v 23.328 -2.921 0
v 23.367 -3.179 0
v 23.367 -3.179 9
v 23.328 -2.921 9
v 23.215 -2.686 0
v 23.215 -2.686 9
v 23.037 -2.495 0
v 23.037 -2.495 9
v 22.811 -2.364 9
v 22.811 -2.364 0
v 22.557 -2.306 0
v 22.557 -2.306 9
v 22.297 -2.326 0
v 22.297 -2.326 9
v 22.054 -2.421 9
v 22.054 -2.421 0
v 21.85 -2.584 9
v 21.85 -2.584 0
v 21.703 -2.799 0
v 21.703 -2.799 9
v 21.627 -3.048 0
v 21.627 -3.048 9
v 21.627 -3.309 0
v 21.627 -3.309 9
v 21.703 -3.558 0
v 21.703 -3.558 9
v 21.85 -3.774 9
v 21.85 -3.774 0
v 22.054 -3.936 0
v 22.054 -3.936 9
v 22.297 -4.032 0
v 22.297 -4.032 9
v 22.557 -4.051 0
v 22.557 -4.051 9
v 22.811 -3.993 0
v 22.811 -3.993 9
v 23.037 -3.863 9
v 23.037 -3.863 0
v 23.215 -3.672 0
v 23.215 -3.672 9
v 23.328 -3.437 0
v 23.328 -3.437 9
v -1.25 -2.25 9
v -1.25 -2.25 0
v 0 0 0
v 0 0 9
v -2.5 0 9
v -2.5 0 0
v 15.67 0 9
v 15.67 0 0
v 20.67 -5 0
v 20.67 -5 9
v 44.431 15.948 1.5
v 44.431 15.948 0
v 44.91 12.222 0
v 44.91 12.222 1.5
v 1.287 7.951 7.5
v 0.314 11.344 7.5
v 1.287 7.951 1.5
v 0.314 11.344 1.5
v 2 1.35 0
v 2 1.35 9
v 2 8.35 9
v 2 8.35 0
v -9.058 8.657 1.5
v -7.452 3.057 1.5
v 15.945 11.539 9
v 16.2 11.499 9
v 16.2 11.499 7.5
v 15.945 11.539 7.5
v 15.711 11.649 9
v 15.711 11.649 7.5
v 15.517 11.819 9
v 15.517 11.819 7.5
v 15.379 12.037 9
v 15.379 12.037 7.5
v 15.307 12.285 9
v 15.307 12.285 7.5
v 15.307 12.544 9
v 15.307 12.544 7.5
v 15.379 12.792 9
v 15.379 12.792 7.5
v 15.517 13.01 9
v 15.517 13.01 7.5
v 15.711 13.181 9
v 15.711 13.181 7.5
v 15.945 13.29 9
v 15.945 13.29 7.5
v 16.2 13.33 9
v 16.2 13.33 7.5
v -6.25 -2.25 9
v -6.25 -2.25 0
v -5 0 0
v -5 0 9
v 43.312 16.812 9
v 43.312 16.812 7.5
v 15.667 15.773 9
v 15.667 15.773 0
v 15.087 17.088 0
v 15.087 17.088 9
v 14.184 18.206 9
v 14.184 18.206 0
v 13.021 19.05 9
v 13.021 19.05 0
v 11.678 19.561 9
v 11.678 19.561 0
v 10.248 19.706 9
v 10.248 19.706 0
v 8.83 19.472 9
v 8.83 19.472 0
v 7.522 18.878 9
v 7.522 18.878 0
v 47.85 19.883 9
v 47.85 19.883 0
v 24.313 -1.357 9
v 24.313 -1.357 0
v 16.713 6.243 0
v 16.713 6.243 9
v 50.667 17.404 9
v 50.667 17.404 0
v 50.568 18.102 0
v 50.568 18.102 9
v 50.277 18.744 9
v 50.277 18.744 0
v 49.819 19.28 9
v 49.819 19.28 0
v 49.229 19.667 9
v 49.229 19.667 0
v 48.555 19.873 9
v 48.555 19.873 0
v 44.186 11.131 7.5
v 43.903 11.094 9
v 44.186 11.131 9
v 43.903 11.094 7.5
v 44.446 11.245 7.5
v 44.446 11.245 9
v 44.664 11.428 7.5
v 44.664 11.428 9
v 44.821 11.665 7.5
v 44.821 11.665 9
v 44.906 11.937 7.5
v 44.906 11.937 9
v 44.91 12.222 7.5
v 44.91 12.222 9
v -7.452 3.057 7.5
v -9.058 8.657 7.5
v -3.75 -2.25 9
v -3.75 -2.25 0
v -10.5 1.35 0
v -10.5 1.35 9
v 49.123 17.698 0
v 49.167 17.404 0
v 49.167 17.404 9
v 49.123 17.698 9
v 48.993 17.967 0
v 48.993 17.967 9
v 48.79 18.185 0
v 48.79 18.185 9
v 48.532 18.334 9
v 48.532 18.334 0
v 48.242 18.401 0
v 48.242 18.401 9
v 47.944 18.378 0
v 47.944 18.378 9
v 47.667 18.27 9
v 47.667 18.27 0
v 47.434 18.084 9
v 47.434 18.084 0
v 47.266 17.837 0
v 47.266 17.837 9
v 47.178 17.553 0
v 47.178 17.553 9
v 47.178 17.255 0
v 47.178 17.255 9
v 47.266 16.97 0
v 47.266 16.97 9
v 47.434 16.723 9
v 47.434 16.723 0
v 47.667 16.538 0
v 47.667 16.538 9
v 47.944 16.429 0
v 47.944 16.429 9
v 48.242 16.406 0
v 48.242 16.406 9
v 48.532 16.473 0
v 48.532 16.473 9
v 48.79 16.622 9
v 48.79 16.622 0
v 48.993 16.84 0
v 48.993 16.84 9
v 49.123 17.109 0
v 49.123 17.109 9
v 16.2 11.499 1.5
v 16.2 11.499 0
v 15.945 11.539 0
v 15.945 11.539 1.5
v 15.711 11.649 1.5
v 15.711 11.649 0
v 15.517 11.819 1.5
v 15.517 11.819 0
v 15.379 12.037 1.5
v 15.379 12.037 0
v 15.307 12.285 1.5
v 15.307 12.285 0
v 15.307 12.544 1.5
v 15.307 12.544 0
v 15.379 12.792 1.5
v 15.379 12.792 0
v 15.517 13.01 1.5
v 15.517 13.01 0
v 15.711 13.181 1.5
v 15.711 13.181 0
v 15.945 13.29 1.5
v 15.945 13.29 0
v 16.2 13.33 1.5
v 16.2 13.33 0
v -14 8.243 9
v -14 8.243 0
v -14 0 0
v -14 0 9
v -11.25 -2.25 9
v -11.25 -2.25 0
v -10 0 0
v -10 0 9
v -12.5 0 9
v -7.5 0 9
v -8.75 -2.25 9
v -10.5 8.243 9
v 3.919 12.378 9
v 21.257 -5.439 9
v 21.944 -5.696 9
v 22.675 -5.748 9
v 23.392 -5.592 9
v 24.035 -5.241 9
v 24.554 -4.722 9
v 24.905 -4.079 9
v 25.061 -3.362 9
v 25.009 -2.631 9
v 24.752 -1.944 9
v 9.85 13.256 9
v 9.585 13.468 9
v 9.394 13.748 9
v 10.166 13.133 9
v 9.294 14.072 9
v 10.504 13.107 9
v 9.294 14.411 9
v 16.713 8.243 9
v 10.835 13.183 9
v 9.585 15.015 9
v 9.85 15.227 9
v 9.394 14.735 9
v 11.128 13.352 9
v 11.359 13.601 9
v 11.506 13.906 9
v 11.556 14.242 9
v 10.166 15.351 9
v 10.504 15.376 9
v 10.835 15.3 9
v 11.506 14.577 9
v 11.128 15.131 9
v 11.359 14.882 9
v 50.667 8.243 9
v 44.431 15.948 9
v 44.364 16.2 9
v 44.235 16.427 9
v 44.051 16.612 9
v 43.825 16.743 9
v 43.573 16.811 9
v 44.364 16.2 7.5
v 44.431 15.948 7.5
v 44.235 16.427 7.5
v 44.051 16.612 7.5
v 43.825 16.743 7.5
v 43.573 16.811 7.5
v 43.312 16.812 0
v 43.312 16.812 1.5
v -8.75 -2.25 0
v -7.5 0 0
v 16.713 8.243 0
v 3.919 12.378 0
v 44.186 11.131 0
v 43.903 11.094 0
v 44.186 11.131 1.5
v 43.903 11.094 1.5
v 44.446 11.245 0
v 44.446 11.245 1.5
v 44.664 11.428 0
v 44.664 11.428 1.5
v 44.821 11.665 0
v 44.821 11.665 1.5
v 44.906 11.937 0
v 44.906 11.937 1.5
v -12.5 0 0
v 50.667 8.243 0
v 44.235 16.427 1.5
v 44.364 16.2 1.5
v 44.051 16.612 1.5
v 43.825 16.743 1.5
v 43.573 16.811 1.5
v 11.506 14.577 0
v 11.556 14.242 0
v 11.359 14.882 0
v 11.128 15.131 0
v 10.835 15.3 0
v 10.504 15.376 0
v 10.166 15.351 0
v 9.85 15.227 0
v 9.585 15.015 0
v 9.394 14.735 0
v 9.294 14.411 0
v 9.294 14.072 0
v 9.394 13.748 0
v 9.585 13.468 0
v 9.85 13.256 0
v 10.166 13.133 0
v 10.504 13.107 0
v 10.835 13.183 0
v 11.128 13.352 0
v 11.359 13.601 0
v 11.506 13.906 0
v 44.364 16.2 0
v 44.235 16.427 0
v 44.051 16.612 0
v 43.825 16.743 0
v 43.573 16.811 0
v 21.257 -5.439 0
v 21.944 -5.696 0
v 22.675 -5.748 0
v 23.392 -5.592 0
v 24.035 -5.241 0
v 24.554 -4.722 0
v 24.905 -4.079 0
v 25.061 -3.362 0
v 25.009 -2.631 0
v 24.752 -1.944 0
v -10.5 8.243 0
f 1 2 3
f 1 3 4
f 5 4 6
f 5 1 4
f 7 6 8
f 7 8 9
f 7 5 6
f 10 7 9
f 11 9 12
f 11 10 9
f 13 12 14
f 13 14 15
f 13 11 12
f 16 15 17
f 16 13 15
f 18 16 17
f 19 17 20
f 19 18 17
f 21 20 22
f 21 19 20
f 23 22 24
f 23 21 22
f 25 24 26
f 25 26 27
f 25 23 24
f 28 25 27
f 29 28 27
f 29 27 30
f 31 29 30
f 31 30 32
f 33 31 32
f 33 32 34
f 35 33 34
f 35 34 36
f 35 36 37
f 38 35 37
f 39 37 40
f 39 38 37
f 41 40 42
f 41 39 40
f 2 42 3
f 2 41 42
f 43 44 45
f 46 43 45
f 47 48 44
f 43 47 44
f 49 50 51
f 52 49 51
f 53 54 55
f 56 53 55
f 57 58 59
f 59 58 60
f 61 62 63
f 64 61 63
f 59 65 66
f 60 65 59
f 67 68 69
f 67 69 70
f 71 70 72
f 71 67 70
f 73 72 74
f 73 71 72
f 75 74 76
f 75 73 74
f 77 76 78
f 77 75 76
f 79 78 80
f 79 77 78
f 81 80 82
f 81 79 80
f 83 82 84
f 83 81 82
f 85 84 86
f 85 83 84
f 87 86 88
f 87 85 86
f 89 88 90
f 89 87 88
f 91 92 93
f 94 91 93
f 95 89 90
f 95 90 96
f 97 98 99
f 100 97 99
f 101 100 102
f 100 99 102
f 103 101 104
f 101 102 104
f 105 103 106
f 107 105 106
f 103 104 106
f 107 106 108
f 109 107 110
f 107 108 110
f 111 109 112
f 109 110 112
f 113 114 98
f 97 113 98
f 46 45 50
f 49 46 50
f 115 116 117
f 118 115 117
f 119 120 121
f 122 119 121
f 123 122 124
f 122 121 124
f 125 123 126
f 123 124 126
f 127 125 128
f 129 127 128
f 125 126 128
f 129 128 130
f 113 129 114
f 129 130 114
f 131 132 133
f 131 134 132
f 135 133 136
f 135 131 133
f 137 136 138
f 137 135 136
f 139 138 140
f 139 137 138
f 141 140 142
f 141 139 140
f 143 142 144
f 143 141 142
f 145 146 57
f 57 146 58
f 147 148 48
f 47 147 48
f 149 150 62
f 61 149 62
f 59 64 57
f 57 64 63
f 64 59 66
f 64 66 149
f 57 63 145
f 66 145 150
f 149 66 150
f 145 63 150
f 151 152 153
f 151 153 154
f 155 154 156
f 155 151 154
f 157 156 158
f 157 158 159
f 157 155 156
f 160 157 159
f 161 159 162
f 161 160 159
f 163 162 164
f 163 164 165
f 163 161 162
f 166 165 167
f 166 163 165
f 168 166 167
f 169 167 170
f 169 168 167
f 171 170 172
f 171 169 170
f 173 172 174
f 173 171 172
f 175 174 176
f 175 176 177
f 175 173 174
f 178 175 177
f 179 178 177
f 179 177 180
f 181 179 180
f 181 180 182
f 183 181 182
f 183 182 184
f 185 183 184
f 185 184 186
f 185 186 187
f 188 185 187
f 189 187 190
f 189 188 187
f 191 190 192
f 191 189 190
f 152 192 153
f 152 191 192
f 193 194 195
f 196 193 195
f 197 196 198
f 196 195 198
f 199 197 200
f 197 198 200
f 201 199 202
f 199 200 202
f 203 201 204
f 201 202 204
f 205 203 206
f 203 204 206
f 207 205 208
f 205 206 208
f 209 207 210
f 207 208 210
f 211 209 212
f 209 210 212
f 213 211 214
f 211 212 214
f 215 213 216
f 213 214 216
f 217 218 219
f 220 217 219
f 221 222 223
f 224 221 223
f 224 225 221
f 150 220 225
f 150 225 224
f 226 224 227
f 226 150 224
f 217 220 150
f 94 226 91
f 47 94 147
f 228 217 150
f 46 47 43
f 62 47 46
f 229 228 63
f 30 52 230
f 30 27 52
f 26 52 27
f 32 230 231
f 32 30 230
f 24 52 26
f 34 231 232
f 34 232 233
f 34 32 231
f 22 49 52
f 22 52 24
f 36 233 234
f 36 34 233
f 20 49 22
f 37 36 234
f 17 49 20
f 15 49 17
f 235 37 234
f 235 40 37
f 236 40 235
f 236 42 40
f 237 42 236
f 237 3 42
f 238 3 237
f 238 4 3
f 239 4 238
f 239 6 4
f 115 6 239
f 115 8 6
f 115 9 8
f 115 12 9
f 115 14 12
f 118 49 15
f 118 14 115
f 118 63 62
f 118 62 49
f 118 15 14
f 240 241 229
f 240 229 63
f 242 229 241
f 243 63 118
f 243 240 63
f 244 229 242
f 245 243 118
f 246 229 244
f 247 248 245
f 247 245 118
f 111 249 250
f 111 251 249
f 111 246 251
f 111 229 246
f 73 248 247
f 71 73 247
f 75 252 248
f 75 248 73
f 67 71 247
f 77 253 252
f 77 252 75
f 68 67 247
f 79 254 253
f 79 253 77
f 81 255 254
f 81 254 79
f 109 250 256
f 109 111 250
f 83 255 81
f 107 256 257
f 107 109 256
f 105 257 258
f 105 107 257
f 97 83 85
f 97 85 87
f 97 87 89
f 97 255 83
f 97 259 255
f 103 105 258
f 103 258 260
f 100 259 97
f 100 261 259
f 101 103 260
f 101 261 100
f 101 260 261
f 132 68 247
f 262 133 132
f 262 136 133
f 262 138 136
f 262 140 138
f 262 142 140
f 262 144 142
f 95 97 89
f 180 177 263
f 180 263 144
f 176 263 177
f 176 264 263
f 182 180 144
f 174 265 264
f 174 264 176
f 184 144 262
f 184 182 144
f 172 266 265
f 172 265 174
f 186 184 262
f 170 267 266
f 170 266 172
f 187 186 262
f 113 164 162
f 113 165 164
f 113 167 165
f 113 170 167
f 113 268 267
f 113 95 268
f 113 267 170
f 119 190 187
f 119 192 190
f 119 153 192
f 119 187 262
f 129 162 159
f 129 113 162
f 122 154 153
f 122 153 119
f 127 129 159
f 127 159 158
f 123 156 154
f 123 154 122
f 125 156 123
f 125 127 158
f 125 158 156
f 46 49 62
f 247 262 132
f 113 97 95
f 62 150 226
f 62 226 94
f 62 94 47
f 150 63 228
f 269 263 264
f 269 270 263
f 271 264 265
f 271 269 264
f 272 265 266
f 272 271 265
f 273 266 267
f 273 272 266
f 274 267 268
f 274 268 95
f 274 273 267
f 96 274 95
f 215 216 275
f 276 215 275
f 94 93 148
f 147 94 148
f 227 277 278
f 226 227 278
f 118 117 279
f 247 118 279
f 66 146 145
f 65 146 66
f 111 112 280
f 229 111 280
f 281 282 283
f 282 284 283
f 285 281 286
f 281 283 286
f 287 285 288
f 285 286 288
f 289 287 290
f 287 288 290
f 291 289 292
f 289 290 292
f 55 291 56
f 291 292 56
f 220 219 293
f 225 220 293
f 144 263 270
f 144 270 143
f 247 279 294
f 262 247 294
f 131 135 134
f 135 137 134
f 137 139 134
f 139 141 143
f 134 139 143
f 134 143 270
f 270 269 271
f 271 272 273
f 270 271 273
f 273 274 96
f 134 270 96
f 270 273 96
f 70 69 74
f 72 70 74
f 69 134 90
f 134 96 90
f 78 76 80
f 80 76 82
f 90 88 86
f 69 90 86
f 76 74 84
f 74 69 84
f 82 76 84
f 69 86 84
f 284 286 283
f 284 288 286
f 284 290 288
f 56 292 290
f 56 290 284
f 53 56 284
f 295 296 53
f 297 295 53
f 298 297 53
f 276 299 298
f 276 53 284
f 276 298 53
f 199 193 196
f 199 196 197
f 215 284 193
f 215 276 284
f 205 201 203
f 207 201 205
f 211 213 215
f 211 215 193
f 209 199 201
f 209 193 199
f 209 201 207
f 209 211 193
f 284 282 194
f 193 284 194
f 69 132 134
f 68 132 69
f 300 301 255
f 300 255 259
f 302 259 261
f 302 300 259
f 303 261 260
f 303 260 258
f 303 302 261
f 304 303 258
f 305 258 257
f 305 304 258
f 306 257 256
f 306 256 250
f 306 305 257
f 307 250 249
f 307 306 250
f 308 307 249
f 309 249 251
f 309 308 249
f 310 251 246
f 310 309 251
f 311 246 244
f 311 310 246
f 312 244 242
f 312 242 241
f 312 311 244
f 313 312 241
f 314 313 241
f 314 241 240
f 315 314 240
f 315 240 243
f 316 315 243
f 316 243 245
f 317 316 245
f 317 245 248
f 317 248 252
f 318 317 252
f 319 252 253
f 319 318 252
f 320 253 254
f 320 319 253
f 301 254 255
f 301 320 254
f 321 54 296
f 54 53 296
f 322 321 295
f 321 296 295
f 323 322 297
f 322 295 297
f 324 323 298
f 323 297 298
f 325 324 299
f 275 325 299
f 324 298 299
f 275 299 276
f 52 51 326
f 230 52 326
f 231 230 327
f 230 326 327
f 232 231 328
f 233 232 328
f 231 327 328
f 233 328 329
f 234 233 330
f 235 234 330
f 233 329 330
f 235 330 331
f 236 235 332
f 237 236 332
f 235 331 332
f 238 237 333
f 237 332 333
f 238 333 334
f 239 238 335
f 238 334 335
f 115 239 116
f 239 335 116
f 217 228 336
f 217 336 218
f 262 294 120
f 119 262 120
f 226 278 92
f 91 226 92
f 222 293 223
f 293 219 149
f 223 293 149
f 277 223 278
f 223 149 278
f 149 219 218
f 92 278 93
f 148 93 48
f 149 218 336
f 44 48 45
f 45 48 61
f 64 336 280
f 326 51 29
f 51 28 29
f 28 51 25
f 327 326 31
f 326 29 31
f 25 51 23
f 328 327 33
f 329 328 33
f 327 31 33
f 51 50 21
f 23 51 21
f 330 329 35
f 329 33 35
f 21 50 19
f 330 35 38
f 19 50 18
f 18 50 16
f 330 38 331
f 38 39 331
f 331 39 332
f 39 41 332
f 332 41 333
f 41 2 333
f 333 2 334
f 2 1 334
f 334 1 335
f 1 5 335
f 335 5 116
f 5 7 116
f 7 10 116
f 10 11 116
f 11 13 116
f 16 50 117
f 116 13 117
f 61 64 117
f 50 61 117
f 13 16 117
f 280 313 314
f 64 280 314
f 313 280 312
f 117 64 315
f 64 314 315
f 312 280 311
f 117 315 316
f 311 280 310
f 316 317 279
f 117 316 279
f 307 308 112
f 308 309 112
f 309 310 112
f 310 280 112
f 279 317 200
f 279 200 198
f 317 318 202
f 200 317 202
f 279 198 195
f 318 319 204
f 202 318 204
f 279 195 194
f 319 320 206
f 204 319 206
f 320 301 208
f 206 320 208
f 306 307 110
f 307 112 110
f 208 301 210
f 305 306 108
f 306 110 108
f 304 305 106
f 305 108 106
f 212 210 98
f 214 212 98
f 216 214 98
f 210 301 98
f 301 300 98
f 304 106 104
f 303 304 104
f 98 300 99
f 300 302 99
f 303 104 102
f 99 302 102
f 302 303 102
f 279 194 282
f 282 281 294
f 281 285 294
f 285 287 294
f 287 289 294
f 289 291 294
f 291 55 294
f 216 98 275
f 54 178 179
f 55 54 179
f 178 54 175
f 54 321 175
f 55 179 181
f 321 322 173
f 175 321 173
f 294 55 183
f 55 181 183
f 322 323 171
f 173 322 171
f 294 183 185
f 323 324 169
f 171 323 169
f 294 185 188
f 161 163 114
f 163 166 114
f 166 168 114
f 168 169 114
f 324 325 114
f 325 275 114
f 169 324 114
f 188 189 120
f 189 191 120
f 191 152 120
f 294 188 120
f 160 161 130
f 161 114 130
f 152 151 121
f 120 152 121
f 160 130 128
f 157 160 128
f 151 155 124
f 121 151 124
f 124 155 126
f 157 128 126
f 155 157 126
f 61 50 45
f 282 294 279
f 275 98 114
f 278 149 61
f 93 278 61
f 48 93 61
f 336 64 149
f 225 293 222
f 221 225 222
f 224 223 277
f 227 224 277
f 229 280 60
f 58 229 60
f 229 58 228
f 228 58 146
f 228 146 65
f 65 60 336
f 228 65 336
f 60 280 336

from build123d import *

# Parameters (mm, degrees)
SKETCH1_R            = 1.1375
SKETCH1_R_2          = 0.875
SKETCH1_R_3          = 1
BOSS_EXTRUDE1_DEPTH  = 9
CUT_EXTRUDE1_DEPTH   = 56.175080092
CUT_EXTRUDE2_REACH   = 58.746
SKETCH4_W            = 9.75
SKETCH4_H            = 6
CUT_EXTRUDE3_DEPTH   = 1.5
FILLET1_R            = 1
FILLET1_OF_MIRROR1_R = 1


with BuildPart() as part:
    # Sketch1 → Boss-Extrude1 (new body)
    with BuildSketch(Plane.XY):
        with BuildLine():
            Line((0, 0), (15.670430223, 0))
            Line((15.670430223, 0), (20.670430223, -5))
            ThreePointArc((20.670430223, -5), (24.313053668, -5), (24.313053668, -1.357376555))
            Line((24.313053668, -1.357376555), (16.71250591, 6.243171203))
            Line((16.71250591, 6.243171203), (16.71250591, 8.243171203))
            Line((16.71250591, 8.243171203), (50.666930898, 8.243171203))
            Line((50.666930898, 8.243171203), (50.666930898, 17.403556883))
            ThreePointArc((50.666930898, 17.403556883), (49.818924912, 19.279967227), (47.850198276, 19.883411807))
            Line((47.850198276, 19.883411807), (15.666930898, 15.772892856))
            ThreePointArc((15.666930898, 15.772892856), (12.366185788, 19.349870594), (7.521934274, 18.87773154))
            Line((7.521934274, 18.87773154), (3.918925439, 12.37773154))
            Line((3.918925439, 12.37773154), (-10.5, 8.243171203))
            Line((-10.5, 8.243171203), (-14, 8.243171203))
            Line((-14, 8.243171203), (-14, 0))
            Line((-14, 0), (-12.5, 0))
            Line((-12.5, 0), (-11.25, -2.25))
            Line((-11.25, -2.25), (-10, 0))
            Line((-10, 0), (-8.75, -2.25))
            Line((-8.75, -2.25), (-7.5, 0))
            Line((-7.5, 0), (-6.25, -2.25))
            Line((-6.25, -2.25), (-5, 0))
            Line((-5, 0), (-3.75, -2.25))
            Line((-3.75, -2.25), (-2.5, 0))
            Line((-2.5, 0), (-1.25, -2.25))
            Line((-1.25, -2.25), (0, 0))
        make_face()
        with Locations((10.418925439, 14.241576548)):
            Circle(SKETCH1_R, mode=Mode.SUBTRACT)
        with Locations((22.491741945, -3.178688277)):
            Circle(SKETCH1_R_2, mode=Mode.SUBTRACT)
        with Locations((48.166930898, 17.403556883)):
            Circle(SKETCH1_R_3, mode=Mode.SUBTRACT)
    extrude(amount=BOSS_EXTRUDE1_DEPTH)

    # Sketch3 → Cut-Extrude1 (cut, through all)
    with BuildSketch(Plane.XY.offset(9)):
        Polygon((-10.5, 1.35), (2, 1.35), (2, 8.35), align=None)
    extrude(amount=-CUT_EXTRUDE1_DEPTH, mode=Mode.SUBTRACT)

    # Cut-Extrude2: up to this plane
    cut_extrude2_end = Plane(origin=(2, 8.35, 0), z_dir=(-0.48860336893184564, 0.8725060159497188, 0))
    # Sketch4 → Cut-Extrude2 (cut, up to the surface)
    with BuildSketch(Plane(origin=(-2.981855105, 10.398964561, 0), x_dir=(0.9612616959383188, 0.2756373558169999, 0), z_dir=(-0.2756373558169999, 0.9612616959383188, 0)), mode=Mode.PRIVATE) as cut_extrude2_sk1:
        with Locations((-1.446121893, -4.5)):
            Rectangle(SKETCH4_W, SKETCH4_H)
    cut_extrude2_tool1 = split(extrude(cut_extrude2_sk1.sketch, amount=-CUT_EXTRUDE2_REACH, mode=Mode.PRIVATE), bisect_by=cut_extrude2_end, keep=Keep.BOTH, mode=Mode.PRIVATE)
    add(cut_extrude2_tool1.solids().sort_by_distance((-4.371957, 10.000359, 4.5))[0], mode=Mode.SUBTRACT)

    # Sketch5 → Cut-Extrude3 (cut)
    with BuildSketch(Plane.XY.offset(9)):
        with BuildLine():
            Line((16.200284742, 13.330448654), (44.30386483, 16.939697768))
            Line((44.30386483, 16.939697768), (45.056740957, 11.077394043))
            Line((45.056740957, 11.077394043), (16.200284742, 11.498637572))
            ThreePointArc((16.200284742, 11.498637572), (15.297651911, 12.414543113), (16.200284742, 13.330448654))
        make_face()
    cut_extrude3 = extrude(amount=-CUT_EXTRUDE3_DEPTH, mode=Mode.SUBTRACT)

    # Fillet1
    fillet1_edges = [part.edges().sort_by_distance(p)[0] for p in [
        (44.30386483, 16.939697768, 8.25),
        (45.056740957, 11.077394043, 8.25),
    ]]
    fillet(fillet1_edges, radius=FILLET1_R)

    # Mirror1: Cut-Extrude3 across plane
    add(cut_extrude3.mirror(Plane.XY.offset(4.5)), mode=Mode.SUBTRACT)

    # Fillet1 of Mirror1
    fillet1_of_mirror1_edges = [part.edges().sort_by_distance(p)[0] for p in [
        (44.30386483, 16.939697768, 0.75),
        (45.056740957, 11.077394043, 0.75),
    ]]
    fillet(fillet1_of_mirror1_edges, radius=FILLET1_OF_MIRROR1_R)


solid = part.part
